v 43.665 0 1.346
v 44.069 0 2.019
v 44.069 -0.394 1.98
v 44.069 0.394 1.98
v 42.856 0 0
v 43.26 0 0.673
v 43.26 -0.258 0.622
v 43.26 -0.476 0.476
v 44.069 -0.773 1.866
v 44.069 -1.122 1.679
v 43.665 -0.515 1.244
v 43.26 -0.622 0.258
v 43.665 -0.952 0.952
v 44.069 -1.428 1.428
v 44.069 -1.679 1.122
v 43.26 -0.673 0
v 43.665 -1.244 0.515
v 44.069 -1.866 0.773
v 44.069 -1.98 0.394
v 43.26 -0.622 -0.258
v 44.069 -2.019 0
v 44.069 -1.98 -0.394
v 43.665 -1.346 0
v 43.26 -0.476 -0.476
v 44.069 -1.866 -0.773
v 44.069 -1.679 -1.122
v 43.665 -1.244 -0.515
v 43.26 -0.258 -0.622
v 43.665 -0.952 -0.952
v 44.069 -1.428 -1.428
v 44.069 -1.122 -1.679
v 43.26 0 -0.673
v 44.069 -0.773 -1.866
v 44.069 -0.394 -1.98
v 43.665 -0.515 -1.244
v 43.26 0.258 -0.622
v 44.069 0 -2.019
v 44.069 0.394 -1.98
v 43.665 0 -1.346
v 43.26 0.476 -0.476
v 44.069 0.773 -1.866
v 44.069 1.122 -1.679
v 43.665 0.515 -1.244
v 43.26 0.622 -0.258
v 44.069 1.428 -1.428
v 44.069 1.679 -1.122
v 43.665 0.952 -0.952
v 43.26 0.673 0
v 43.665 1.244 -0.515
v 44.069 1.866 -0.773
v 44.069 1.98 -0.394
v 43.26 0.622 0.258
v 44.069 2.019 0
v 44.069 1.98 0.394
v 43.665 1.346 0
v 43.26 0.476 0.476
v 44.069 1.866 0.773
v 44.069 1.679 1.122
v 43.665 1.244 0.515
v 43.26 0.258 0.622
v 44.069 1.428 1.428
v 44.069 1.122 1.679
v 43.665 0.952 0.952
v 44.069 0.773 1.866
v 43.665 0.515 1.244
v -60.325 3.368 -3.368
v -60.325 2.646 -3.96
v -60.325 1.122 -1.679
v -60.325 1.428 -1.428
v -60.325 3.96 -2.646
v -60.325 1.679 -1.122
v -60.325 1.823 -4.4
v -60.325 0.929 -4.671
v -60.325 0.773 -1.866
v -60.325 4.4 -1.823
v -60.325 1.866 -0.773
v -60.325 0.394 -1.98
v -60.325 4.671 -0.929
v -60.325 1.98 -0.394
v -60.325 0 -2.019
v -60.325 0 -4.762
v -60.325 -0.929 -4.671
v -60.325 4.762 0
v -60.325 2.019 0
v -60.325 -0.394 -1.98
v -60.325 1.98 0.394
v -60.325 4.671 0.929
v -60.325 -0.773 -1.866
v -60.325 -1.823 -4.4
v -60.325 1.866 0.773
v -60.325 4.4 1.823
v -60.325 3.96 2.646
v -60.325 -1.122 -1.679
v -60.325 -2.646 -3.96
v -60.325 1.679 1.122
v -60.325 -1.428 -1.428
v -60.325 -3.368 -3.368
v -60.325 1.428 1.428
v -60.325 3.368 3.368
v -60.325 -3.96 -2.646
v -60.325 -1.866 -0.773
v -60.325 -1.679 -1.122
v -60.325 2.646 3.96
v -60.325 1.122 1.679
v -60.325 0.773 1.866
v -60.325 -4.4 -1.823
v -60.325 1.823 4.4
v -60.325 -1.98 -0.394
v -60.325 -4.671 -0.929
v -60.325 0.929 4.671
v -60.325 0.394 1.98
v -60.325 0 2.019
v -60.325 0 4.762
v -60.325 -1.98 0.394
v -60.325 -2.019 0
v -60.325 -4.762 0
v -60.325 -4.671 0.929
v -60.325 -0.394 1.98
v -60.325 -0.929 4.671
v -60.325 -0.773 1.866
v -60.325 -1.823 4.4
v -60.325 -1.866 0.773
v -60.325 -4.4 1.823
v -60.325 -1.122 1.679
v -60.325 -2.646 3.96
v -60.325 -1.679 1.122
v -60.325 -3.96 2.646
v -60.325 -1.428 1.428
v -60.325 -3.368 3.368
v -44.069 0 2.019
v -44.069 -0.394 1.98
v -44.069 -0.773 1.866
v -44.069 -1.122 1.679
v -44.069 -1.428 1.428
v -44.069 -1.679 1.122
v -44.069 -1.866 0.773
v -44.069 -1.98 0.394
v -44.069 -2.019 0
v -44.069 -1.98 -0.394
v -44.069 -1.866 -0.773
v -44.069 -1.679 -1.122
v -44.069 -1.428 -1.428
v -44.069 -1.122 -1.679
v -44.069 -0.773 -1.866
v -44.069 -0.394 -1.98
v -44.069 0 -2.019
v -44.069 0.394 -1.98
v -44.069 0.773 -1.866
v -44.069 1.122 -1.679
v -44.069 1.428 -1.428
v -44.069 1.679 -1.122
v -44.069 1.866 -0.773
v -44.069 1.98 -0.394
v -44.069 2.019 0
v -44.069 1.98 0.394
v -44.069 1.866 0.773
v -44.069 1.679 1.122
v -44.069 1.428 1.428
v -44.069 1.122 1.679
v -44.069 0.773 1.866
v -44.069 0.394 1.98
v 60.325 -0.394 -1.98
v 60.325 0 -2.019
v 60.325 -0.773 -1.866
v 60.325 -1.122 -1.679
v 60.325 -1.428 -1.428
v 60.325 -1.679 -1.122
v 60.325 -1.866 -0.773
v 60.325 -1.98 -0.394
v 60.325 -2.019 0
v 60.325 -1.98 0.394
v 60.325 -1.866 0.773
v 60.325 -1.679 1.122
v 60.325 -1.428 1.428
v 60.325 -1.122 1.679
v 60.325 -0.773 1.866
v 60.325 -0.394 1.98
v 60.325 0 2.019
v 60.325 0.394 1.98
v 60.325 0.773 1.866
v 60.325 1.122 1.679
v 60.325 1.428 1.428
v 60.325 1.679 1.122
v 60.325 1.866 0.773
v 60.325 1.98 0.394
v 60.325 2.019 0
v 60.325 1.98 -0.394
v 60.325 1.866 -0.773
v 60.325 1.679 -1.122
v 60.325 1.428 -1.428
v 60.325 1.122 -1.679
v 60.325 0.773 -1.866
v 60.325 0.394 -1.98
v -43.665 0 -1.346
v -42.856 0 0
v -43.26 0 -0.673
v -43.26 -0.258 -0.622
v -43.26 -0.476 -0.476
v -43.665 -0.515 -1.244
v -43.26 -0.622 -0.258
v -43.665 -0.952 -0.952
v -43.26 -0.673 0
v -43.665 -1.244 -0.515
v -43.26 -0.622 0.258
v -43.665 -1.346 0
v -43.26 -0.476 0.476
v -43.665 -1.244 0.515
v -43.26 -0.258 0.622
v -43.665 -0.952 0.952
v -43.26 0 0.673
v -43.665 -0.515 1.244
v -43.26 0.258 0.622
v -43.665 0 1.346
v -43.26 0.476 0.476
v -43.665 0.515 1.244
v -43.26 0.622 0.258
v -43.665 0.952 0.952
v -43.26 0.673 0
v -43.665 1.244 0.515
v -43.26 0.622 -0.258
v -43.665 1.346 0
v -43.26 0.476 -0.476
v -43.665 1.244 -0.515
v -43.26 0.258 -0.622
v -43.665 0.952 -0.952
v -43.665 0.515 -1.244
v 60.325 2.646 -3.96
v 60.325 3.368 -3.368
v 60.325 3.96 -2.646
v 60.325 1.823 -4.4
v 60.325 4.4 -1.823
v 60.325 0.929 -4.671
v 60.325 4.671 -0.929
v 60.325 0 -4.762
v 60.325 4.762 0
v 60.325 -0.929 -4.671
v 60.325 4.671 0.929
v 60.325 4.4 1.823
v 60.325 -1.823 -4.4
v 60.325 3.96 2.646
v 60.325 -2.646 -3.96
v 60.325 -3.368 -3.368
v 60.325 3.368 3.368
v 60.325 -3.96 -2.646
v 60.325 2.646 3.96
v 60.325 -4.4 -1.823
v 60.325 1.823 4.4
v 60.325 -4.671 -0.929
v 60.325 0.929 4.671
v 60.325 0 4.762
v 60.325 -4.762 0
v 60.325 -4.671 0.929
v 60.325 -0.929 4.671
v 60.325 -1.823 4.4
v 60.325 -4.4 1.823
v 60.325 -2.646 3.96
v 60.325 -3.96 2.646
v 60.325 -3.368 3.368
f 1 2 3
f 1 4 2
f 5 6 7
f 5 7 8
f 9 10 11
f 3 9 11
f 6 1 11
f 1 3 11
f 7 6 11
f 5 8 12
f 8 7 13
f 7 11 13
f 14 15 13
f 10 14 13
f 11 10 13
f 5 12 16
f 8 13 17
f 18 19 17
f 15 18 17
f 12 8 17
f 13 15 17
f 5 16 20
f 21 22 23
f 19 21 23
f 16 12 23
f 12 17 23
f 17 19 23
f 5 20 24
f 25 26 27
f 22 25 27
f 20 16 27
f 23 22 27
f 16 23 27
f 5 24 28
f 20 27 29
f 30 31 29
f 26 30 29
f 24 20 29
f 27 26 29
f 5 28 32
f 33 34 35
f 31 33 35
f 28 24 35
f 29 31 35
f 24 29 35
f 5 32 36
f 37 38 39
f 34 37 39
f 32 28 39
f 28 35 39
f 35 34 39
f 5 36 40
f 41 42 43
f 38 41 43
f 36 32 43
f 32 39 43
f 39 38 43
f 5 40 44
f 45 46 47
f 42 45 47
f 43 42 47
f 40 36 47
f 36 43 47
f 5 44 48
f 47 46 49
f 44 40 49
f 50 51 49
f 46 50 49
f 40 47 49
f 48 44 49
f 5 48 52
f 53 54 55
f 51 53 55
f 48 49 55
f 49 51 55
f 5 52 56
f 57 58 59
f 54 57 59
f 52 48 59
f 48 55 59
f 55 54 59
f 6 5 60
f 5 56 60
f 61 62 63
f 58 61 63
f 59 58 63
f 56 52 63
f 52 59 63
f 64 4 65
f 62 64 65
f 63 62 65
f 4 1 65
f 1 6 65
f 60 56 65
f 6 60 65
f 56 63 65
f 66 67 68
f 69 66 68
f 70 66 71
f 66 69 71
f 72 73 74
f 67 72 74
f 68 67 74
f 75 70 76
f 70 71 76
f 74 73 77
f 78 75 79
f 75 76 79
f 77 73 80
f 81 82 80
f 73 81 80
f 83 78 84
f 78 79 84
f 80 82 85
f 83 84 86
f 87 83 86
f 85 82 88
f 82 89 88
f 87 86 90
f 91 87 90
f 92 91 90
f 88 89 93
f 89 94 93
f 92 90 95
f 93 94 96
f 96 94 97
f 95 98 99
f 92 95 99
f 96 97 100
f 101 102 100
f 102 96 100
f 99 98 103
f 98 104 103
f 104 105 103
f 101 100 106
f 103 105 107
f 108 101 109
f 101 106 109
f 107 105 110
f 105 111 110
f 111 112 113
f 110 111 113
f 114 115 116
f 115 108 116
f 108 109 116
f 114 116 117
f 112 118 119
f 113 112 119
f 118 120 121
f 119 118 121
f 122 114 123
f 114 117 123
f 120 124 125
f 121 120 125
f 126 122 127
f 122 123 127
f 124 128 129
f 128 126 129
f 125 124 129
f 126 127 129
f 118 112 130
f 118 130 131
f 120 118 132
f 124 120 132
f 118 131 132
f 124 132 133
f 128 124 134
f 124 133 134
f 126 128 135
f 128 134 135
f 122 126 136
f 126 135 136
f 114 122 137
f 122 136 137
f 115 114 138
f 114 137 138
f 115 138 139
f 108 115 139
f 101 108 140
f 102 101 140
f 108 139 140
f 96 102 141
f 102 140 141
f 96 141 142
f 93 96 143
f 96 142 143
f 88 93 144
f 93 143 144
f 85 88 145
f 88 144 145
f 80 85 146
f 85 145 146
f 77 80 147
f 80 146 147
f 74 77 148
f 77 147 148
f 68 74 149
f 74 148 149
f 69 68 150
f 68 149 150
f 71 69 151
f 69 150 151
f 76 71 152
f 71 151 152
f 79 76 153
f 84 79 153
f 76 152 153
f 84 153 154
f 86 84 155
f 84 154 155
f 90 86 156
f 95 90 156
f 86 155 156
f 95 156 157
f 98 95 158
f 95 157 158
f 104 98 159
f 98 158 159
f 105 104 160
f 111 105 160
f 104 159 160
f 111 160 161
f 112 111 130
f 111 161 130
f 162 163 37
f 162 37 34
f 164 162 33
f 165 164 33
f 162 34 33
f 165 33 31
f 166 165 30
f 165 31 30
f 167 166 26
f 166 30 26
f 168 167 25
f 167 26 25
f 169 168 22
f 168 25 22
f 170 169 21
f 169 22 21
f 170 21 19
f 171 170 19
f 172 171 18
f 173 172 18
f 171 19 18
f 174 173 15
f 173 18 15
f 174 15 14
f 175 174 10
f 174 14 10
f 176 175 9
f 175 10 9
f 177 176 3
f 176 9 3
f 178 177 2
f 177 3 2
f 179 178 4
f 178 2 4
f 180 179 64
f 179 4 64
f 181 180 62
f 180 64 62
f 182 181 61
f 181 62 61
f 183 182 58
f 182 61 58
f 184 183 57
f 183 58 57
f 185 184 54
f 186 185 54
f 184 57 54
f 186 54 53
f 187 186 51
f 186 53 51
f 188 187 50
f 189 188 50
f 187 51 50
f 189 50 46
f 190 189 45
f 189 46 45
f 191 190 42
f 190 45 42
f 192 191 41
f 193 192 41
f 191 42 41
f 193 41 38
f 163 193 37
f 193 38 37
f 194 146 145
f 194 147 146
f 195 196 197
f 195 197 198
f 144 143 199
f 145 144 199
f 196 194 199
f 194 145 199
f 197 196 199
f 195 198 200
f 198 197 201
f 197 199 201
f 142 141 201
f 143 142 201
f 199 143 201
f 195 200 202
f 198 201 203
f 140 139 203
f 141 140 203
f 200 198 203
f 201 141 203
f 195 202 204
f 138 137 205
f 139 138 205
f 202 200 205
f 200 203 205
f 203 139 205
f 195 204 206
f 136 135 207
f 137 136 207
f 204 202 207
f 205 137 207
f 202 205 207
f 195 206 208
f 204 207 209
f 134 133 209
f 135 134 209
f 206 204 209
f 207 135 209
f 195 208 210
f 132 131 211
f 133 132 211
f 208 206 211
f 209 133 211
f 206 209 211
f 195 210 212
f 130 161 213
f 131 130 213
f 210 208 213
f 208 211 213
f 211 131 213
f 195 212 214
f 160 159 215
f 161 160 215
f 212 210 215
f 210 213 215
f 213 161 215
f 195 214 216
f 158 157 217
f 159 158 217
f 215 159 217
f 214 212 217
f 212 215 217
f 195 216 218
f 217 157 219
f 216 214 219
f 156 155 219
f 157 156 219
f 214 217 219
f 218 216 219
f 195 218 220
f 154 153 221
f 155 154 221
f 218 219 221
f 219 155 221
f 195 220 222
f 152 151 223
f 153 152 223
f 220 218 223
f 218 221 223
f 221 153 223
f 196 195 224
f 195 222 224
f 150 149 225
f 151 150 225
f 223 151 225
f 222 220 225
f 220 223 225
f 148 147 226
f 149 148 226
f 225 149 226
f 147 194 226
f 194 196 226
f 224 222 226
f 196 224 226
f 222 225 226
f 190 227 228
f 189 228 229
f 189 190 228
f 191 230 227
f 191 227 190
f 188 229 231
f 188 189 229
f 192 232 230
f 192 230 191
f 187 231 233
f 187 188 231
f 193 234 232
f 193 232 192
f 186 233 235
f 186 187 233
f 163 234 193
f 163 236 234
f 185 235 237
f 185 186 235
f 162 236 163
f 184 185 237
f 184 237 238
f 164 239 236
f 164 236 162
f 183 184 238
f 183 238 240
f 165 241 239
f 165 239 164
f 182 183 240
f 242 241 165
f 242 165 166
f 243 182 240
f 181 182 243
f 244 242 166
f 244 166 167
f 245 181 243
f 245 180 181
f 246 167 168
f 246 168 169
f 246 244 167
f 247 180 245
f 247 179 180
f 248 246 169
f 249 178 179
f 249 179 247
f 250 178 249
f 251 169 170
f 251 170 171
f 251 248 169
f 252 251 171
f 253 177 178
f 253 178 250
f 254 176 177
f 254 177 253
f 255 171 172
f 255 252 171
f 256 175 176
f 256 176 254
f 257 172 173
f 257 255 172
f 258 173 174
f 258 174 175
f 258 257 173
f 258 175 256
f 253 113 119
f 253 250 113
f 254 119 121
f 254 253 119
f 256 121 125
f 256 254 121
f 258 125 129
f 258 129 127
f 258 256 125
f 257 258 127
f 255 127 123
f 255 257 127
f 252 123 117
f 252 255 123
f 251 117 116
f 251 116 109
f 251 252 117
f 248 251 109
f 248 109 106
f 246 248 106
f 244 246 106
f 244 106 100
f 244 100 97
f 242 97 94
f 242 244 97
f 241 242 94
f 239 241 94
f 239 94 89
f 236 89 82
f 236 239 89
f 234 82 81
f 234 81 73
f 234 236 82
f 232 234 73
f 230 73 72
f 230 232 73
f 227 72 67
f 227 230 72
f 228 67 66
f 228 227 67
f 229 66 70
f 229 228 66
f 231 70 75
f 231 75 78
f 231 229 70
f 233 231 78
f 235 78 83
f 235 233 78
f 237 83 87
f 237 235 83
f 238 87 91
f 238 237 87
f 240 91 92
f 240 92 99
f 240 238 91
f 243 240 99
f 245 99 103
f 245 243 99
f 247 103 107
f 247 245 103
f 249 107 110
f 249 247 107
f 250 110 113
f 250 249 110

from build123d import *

# Parameters (mm, degrees)
SKETCH1_R                            = 4.7625
BOSS_EXTRUDE1_DEPTH                  = 60.325
F_10_32_TAPPED_HOLE1_D               = 4.0386
F_10_32_TAPPED_HOLE1_DEPTH           = 16.256
F_10_32_TAPPED_HOLE1_TIP             = 1.213317848
F_10_32_TAPPED_HOLE1_ON_FACE_2_D     = 4.0386
F_10_32_TAPPED_HOLE1_ON_FACE_2_DEPTH = 16.256
F_10_32_TAPPED_HOLE1_ON_FACE_2_TIP   = 1.213317848


with BuildPart() as part:
    # Sketch1 → Boss-Extrude1 (new, symmetric)
    with BuildSketch(Plane(origin=(0, 0, 0), x_dir=(0, 0, -1), z_dir=(1, 0, 0))):
        with Locations(Location((0, 0, 0), (0, 0, 180))):
            Circle(SKETCH1_R)
    extrude(amount=BOSS_EXTRUDE1_DEPTH, both=True)

    # #10-32 Tapped Hole1
    with Locations(Plane(origin=(60.325, 0, 0), x_dir=(0, 0, 1), z_dir=(1, 0, 0))):
        with Locations((0, 0)):
            Hole(F_10_32_TAPPED_HOLE1_D / 2, depth=F_10_32_TAPPED_HOLE1_DEPTH)
            with Locations((0, 0, -(F_10_32_TAPPED_HOLE1_DEPTH + F_10_32_TAPPED_HOLE1_TIP / 2))):  # 118° drill point
                Cone(0, F_10_32_TAPPED_HOLE1_D / 2, F_10_32_TAPPED_HOLE1_TIP, mode=Mode.SUBTRACT)

    # #10-32 Tapped Hole1 on face 2
    with Locations(Plane(origin=(-60.325, 0, 0), x_dir=(0, 0, -1), z_dir=(-1, 0, 0))):
        with Locations((0, 0)):
            Hole(F_10_32_TAPPED_HOLE1_ON_FACE_2_D / 2, depth=F_10_32_TAPPED_HOLE1_ON_FACE_2_DEPTH)
            with Locations((0, 0, -(F_10_32_TAPPED_HOLE1_ON_FACE_2_DEPTH + F_10_32_TAPPED_HOLE1_ON_FACE_2_TIP / 2))):  # 118° drill point
                Cone(0, F_10_32_TAPPED_HOLE1_ON_FACE_2_D / 2, F_10_32_TAPPED_HOLE1_ON_FACE_2_TIP, mode=Mode.SUBTRACT)


solid = part.part
